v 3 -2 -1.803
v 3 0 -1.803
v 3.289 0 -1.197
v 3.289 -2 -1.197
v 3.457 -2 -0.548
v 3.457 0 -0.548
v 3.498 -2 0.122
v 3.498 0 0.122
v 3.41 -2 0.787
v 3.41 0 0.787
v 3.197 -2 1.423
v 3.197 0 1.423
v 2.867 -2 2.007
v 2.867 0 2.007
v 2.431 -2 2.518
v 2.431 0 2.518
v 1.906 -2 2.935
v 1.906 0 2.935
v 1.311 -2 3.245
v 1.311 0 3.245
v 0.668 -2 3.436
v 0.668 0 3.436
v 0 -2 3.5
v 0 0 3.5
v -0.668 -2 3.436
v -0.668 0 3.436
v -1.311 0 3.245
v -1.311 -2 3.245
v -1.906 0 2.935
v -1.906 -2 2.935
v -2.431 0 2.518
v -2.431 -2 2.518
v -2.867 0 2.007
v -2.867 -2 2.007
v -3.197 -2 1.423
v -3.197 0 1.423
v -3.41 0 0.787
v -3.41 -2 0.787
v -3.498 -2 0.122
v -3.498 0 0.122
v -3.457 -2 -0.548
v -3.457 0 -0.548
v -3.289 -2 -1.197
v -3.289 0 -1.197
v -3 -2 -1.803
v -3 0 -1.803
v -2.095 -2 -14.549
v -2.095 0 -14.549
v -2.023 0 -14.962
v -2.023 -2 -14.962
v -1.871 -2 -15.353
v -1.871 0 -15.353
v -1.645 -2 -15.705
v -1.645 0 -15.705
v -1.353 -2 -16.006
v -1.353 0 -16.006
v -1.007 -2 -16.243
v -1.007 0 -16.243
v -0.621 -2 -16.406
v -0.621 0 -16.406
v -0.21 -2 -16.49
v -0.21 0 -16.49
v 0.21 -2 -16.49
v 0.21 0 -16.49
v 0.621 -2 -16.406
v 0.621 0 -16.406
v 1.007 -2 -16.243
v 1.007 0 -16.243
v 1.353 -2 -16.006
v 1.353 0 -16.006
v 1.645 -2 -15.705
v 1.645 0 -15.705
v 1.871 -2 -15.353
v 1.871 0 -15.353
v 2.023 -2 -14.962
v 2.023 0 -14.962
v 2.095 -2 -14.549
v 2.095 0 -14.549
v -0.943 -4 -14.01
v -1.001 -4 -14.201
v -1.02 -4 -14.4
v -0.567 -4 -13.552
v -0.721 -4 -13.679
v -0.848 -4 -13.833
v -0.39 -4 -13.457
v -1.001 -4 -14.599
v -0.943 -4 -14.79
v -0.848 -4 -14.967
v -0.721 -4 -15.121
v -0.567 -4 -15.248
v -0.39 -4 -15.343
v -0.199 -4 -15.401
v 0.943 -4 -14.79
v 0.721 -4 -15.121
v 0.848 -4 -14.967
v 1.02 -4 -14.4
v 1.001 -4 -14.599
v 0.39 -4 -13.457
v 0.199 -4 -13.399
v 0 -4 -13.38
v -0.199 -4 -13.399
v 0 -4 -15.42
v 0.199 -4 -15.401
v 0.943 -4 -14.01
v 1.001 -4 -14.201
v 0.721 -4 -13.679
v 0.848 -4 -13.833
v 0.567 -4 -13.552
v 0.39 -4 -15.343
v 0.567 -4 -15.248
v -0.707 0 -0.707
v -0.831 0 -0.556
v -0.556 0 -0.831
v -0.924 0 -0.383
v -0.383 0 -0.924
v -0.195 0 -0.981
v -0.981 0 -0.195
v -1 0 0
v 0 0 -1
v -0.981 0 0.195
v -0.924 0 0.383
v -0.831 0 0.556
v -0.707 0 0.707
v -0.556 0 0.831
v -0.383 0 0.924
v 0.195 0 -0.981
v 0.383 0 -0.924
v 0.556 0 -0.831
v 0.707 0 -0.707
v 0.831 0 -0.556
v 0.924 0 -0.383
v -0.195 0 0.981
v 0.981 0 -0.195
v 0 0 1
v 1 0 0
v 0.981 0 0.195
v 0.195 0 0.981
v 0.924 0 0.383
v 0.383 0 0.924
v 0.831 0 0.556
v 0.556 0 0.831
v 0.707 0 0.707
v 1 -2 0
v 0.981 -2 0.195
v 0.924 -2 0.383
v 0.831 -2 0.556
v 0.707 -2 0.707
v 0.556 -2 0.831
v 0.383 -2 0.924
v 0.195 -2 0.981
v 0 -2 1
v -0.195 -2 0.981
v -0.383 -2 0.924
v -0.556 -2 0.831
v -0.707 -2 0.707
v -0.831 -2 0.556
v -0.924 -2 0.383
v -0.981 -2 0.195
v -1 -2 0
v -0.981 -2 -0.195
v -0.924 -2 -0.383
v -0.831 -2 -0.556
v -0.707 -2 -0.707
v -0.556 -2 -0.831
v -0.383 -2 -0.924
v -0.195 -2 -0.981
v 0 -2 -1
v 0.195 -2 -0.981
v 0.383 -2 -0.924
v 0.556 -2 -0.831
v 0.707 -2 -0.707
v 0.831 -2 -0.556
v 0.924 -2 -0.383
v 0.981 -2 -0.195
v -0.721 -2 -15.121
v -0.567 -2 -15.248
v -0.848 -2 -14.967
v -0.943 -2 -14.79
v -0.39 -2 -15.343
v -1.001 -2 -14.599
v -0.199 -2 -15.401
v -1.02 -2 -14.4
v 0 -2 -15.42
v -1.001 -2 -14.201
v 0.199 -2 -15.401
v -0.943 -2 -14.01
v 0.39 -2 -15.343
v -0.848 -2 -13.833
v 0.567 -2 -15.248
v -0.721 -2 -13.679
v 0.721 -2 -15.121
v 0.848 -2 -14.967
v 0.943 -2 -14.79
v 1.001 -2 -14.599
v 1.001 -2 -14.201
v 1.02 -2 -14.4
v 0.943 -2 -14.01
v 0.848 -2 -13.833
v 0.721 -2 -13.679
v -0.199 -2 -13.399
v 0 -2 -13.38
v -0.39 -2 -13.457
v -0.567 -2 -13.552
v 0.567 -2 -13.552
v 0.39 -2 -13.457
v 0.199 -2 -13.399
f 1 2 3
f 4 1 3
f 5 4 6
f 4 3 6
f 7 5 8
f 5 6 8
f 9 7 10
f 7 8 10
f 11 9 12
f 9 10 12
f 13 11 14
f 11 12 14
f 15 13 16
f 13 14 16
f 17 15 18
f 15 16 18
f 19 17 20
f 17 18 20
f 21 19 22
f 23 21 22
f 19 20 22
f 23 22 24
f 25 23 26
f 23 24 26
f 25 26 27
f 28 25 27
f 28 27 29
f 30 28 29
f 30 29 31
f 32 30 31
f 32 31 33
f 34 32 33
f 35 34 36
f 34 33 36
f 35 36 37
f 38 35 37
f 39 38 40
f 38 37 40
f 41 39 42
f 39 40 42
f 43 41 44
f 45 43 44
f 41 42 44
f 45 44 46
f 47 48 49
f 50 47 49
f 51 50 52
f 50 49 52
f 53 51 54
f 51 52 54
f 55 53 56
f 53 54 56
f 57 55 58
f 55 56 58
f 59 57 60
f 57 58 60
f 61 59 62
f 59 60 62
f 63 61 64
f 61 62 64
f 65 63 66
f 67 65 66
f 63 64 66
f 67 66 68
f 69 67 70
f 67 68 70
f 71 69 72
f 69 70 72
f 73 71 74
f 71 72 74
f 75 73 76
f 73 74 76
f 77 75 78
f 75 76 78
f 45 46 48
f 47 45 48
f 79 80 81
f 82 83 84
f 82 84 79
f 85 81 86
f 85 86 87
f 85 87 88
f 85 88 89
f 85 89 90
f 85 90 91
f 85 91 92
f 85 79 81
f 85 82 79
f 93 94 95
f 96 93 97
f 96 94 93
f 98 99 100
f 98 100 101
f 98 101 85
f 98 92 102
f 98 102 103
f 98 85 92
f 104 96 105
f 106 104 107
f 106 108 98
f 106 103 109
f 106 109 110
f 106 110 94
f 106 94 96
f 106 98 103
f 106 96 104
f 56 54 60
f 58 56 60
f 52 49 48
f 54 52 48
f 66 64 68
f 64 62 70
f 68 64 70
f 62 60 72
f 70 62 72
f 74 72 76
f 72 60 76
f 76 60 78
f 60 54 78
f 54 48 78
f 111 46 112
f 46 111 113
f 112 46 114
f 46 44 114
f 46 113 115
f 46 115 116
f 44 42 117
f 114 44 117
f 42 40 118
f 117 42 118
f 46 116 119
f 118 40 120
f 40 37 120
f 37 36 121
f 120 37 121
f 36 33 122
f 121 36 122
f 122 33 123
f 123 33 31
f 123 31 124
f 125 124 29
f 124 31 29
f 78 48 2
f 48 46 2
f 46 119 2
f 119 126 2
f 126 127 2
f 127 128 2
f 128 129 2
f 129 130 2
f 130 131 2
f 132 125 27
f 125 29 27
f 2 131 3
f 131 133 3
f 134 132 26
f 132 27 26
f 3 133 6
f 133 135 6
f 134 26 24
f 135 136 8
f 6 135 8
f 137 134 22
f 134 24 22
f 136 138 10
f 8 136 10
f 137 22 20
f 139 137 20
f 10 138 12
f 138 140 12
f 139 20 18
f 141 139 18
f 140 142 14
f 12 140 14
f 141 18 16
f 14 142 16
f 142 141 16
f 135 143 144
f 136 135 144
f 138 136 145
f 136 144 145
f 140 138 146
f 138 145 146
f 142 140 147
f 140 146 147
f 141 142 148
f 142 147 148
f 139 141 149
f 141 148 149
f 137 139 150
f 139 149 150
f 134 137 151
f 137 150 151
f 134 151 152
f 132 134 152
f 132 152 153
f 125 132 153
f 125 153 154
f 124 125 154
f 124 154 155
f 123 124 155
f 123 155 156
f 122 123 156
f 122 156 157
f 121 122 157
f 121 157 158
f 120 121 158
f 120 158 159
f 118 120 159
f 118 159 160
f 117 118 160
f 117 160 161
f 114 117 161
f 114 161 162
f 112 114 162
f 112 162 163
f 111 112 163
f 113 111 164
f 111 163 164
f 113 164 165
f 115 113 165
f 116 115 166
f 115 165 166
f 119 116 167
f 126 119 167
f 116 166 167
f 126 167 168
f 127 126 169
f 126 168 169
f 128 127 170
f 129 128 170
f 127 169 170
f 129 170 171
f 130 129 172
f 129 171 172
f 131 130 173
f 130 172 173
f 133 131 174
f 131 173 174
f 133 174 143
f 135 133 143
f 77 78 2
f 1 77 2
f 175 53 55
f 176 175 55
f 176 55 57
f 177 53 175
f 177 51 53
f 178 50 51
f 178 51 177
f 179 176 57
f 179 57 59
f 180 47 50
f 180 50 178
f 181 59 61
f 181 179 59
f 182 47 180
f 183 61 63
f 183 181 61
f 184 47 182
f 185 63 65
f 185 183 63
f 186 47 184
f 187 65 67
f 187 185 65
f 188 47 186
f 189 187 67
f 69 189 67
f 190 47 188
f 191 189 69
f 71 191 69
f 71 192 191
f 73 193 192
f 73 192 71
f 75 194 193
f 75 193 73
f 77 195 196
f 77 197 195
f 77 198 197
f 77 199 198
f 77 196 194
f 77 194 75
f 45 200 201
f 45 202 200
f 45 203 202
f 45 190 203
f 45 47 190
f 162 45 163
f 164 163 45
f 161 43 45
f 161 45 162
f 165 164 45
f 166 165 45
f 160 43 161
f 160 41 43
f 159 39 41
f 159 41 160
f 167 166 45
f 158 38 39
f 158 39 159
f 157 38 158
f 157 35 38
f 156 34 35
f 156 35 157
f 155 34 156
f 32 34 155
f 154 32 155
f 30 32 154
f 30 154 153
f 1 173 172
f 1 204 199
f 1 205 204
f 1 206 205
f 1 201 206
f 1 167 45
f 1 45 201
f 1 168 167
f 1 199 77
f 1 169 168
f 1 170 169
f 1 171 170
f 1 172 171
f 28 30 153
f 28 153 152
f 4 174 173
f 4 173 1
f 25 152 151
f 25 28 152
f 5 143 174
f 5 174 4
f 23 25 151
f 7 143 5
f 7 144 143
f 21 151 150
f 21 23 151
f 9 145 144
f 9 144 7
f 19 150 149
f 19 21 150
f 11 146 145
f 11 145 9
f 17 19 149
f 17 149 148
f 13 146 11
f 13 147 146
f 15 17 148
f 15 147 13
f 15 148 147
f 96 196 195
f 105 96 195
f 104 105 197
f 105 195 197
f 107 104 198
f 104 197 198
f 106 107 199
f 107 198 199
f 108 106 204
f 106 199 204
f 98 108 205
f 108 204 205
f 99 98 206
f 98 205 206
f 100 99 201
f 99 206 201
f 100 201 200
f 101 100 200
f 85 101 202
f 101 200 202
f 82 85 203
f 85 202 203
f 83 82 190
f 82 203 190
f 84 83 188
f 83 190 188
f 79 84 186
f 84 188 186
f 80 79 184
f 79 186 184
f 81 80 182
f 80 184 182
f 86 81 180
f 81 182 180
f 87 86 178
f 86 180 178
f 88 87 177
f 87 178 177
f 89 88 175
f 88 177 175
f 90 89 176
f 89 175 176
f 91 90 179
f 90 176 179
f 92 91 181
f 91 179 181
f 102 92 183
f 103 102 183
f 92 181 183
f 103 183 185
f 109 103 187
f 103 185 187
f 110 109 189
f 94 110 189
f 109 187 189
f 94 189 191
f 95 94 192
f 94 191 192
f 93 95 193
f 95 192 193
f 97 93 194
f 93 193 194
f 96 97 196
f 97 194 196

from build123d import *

# Parameters (mm, degrees)
F1_DEPTH = 2
F2_R     = 1
F3_DEPTH = 25
F4_R     = 1.020261
F5_DEPTH = 2


with BuildPart() as f1:
    # F0 (on Front) → F1 (new body)
    with BuildSketch(Plane.XZ):
        with BuildLine():
            Line((2.094723, -14.548776), (3, -1.802776))
            ThreePointArc((3, -1.802776), (0, 3.5), (-3, -1.802776))
            Line((-3, -1.802776), (-2.094723, -14.548776))
            ThreePointArc((-2.094723, -14.548776), (0, -16.5), (2.094723, -14.548776))
        make_face()
    extrude(amount=F1_DEPTH)

    # F2 (on face) → F3 (cut)
    with BuildSketch(Plane.XZ.offset(2)):
        Circle(F2_R)
    extrude(amount=-F3_DEPTH, mode=Mode.SUBTRACT)

    # F4 (on face) → F5 (join)
    with BuildSketch(Plane.XZ.offset(2)):
        with Locations((0, -14.4)):
            Circle(F4_R)
    extrude(amount=F5_DEPTH)


solid = f1.part
